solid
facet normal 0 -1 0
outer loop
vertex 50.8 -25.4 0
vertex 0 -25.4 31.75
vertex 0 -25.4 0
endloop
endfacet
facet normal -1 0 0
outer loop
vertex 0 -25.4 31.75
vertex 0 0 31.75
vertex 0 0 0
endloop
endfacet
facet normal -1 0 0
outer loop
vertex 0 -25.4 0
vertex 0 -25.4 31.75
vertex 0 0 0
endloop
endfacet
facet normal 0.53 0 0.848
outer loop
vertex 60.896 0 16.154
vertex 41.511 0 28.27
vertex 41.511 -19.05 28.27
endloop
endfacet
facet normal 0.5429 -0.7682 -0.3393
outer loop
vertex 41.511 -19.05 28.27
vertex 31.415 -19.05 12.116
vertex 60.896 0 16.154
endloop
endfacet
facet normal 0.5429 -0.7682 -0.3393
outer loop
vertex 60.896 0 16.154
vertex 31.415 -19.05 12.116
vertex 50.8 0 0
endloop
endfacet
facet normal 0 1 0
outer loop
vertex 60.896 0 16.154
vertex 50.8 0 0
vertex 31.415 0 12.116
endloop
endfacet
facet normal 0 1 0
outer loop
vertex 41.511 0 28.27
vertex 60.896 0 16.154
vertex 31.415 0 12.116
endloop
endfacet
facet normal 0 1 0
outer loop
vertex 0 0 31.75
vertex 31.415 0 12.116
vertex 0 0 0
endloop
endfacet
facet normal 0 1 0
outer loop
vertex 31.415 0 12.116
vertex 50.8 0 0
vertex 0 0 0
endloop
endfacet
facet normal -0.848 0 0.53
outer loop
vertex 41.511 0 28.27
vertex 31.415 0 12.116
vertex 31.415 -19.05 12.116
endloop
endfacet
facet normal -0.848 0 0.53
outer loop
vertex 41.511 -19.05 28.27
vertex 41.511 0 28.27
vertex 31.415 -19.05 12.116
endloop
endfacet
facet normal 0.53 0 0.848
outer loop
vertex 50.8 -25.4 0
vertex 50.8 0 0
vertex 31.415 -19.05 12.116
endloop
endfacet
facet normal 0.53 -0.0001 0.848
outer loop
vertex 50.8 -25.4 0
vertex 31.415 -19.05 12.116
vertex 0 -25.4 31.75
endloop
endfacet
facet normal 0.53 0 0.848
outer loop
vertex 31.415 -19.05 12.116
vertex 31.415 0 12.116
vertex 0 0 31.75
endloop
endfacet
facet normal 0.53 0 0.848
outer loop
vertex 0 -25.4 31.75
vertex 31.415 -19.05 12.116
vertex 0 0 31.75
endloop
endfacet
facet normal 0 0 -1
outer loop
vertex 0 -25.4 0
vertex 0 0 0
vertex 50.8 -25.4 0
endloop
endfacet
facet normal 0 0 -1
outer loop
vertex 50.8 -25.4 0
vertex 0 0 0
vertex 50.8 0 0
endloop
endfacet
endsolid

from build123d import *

# Parameters (mm, degrees)
F1_DEPTH = 25.4
F3_DEPTH = 19.05


with BuildPart() as f1:
    # F0 (on Front) → F1 (new body)
    with BuildSketch(Plane.XZ):
        Polygon((0, 31.75), (0, 0), (50.8, 0), align=None)
    extrude(amount=F1_DEPTH)

    # F2 (on face) → F3 (join)
    with BuildSketch(Plane(origin=(14.2696629213, 0, 22.8314606742), x_dir=(0.847998304, 0, -0.52999894), z_dir=(0.52999894, 0, 0.847998304))):
        Polygon((20.2183138435, -19.05), (43.0783138435, 0), (20.2183138435, 0), align=None)
    extrude(amount=F3_DEPTH)


solid = f1.part
